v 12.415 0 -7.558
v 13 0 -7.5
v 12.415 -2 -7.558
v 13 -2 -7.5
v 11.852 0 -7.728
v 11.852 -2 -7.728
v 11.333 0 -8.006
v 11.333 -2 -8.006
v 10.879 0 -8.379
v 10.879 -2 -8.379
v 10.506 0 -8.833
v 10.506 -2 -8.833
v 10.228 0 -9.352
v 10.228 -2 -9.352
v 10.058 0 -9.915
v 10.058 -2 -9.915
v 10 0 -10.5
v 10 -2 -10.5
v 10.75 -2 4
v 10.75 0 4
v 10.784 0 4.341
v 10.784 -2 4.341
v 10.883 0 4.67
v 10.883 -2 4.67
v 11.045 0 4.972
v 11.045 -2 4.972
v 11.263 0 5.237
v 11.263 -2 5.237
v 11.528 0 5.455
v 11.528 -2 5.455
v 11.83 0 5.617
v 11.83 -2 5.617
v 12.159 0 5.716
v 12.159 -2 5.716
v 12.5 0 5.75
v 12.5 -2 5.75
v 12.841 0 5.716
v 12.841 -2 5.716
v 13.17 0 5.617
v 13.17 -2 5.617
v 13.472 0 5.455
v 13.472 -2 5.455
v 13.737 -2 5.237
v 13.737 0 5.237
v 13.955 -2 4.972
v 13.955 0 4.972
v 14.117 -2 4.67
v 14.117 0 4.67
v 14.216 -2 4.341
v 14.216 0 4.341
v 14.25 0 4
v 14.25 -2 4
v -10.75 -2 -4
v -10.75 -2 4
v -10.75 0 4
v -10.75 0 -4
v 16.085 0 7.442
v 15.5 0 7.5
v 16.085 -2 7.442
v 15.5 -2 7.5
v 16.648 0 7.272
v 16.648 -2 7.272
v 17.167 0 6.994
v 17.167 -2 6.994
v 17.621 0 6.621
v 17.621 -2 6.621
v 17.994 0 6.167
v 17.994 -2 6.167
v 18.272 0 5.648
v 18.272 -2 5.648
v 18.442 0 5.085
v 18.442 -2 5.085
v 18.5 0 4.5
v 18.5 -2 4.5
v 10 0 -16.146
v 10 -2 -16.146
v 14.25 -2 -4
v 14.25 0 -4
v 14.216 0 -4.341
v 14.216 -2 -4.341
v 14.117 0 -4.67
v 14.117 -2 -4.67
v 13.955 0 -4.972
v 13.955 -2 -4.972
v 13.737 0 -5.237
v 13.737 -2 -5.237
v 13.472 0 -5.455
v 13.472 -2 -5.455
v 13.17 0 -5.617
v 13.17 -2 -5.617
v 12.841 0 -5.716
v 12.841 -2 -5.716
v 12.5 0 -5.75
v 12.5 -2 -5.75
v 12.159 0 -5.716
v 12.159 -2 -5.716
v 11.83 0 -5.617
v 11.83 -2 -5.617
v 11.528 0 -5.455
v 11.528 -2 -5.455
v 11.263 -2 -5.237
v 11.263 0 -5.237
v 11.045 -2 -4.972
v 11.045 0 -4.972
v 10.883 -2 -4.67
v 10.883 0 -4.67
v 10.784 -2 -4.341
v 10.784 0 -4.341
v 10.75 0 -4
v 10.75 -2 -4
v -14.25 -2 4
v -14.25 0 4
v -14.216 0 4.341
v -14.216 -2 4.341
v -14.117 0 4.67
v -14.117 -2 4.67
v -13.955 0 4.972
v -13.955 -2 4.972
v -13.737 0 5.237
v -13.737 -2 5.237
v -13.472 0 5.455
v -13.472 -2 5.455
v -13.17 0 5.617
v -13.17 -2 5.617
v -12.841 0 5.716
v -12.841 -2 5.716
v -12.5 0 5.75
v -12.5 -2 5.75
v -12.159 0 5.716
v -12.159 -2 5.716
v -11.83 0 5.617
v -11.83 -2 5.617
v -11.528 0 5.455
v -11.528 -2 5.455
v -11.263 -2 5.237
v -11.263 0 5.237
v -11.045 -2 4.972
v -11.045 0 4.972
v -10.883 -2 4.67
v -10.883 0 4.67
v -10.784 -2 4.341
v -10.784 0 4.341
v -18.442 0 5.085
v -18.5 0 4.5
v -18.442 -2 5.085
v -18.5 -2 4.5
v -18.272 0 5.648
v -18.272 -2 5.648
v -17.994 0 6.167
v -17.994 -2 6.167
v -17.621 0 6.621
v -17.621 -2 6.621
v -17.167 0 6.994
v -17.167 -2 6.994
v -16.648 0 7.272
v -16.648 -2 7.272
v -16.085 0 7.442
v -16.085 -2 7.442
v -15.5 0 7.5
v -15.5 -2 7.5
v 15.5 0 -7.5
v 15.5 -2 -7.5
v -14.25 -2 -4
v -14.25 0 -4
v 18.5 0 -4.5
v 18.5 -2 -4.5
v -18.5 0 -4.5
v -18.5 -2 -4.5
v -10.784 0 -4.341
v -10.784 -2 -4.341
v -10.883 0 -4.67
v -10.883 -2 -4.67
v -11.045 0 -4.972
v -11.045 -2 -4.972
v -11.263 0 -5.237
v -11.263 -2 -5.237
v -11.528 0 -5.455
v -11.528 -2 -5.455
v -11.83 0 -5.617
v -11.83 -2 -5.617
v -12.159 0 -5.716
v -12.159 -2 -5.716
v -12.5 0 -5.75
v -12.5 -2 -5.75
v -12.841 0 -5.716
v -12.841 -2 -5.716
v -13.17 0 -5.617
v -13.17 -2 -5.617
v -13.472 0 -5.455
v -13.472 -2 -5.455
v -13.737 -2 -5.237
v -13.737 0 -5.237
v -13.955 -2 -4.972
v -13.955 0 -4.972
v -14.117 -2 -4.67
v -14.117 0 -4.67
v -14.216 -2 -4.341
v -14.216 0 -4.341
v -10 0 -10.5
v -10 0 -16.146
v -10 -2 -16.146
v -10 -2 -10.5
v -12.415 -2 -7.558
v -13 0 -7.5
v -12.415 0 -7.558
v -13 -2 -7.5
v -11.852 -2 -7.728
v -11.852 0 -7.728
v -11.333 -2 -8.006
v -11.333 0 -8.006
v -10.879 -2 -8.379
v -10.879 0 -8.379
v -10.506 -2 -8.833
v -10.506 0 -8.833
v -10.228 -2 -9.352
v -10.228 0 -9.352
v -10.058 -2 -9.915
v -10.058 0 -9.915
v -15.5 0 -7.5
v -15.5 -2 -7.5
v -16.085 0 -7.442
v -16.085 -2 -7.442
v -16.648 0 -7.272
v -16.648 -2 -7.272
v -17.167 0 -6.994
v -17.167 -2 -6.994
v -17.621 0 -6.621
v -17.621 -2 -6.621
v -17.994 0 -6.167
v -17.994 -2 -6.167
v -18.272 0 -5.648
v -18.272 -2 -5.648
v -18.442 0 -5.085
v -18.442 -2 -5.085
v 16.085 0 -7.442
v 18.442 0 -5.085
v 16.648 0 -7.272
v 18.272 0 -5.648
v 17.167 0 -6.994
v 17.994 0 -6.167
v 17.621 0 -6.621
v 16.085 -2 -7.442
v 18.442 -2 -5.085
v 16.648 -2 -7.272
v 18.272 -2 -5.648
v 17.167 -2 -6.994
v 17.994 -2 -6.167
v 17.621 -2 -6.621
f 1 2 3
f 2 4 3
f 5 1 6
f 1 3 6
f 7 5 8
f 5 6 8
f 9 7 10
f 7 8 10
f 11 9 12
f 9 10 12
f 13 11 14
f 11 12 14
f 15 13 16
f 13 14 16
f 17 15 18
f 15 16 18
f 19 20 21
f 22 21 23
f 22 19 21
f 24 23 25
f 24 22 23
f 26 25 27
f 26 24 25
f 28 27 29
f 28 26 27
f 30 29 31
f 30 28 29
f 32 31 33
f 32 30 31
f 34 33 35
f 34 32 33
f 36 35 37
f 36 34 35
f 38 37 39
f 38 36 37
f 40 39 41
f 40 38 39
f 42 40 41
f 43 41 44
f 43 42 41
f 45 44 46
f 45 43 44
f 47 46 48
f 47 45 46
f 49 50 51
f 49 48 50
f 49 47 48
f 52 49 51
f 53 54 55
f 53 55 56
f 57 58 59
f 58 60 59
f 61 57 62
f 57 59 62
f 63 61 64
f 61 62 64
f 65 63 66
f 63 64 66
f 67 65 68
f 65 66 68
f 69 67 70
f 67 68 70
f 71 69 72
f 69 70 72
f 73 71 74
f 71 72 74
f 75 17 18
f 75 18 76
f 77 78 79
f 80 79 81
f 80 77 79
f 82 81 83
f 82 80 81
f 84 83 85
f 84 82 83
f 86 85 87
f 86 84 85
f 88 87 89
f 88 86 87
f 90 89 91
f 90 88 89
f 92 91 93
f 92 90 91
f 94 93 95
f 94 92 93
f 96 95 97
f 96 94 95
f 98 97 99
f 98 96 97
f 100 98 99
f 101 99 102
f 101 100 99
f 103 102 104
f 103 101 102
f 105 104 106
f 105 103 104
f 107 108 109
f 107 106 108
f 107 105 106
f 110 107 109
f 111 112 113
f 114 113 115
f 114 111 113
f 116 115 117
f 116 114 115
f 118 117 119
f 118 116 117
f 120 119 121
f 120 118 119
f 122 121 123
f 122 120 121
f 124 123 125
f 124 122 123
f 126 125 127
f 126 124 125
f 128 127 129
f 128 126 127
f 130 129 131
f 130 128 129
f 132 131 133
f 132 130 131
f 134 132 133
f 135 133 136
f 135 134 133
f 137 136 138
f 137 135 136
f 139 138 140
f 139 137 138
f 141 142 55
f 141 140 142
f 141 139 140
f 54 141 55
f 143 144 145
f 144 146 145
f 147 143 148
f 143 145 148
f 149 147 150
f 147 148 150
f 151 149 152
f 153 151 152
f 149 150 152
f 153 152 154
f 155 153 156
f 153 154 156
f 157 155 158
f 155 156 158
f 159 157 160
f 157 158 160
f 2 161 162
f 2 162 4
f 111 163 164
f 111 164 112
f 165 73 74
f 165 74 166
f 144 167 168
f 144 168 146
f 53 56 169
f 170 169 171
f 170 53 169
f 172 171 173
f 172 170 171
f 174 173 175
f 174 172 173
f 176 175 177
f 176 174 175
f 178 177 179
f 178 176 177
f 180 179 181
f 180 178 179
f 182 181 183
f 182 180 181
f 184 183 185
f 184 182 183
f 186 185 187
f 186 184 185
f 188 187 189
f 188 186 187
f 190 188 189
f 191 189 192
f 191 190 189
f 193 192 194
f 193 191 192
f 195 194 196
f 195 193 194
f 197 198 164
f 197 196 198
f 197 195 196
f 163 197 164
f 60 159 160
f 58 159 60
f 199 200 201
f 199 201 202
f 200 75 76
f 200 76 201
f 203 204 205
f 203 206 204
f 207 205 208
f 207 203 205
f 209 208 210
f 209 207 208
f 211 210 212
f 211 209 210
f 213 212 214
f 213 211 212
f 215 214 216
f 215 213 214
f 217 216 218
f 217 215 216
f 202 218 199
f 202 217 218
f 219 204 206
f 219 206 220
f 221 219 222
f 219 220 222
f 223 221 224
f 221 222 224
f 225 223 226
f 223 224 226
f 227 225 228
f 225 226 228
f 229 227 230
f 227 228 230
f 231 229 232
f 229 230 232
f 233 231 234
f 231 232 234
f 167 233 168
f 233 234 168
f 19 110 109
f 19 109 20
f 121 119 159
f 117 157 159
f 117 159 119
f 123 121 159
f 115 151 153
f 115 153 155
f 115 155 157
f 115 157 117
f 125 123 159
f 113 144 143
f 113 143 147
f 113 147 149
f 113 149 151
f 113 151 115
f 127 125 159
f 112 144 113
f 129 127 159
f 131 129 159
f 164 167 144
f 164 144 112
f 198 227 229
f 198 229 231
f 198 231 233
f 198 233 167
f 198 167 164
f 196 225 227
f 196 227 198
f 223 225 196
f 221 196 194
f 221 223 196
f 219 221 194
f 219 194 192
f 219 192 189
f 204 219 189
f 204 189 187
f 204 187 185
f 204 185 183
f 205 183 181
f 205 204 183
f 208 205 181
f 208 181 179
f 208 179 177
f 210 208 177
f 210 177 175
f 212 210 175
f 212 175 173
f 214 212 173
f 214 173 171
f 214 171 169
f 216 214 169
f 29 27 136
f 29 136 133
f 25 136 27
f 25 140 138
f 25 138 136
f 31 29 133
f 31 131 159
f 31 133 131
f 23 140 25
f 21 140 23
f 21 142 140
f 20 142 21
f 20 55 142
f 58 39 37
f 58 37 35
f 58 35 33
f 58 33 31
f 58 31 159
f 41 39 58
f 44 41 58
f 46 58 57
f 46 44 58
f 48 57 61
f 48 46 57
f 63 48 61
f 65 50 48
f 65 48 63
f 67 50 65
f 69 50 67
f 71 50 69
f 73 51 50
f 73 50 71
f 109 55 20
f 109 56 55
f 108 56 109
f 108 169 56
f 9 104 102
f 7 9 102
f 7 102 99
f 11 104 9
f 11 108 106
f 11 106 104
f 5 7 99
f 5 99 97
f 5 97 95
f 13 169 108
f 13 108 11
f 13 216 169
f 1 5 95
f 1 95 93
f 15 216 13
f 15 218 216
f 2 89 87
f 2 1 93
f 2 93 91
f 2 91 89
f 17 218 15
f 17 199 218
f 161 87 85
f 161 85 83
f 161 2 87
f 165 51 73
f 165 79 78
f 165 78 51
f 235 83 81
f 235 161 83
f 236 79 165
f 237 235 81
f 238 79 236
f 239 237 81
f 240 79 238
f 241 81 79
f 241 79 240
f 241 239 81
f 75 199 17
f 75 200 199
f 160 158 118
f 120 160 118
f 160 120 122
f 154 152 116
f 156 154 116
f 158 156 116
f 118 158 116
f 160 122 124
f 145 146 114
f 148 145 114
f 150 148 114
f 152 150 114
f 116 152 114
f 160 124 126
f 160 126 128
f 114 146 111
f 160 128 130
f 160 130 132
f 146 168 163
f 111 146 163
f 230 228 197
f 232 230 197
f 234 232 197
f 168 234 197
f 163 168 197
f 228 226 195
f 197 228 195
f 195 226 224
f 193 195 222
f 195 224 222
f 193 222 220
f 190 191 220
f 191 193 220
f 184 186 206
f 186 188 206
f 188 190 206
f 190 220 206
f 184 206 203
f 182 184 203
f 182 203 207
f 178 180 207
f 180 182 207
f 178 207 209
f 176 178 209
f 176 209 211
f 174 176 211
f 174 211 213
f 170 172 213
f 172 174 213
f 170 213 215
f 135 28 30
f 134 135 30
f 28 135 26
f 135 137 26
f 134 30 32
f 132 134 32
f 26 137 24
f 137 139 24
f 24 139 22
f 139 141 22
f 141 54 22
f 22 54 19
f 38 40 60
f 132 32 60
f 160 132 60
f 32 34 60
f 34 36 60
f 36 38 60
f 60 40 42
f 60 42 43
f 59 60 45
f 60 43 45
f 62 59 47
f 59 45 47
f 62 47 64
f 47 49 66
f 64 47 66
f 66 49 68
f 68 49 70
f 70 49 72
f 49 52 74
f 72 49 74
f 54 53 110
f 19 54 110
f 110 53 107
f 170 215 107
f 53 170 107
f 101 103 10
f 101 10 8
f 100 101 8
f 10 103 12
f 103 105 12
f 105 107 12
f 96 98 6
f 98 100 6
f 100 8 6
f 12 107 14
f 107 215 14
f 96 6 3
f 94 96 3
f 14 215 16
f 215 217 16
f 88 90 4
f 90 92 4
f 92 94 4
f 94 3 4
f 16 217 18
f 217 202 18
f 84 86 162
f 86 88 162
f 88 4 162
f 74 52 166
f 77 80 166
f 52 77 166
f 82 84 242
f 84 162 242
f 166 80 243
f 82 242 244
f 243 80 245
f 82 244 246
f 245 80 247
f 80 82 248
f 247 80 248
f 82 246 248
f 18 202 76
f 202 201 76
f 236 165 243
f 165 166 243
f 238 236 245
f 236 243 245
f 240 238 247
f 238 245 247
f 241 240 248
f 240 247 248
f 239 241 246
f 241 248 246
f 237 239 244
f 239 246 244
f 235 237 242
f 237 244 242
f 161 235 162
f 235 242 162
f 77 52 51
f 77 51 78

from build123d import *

# Parameters (mm, degrees)
SM_BASE_FLANGE_1_DEPTH = 2
FILLET_1_R             = 3
CUT_EXTRUDE_1_DEPTH    = 10


# Sheet-metal steps are written as plain solids
with BuildPart() as part:
    # Sketch 1 → 基体-法兰1 (new body)
    with BuildSketch(Plane(origin=(0, 0, 0), x_dir=(1, 0, 0), z_dir=(0, 1, 0))):
        Polygon((-10, 7.5), (-18.5, 7.5), (-18.5, -7.5), (18.5, -7.5), (18.5, 7.5), (10, 7.5), (10, 16.146039932), (-10, 16.146039932), align=None)
    extrude(amount=-SM_BASE_FLANGE_1_DEPTH)

    # 圆角1
    fillet_1_edges = [part.edges().sort_by_distance(p)[0] for p in [
        (18.5, -1, -7.5),
        (18.5, -1, 7.5),
        (-18.5, -1, 7.5),
        (-18.5, -1, -7.5),
        (-10, -1, -7.5),
        (10, -1, -7.5),
    ]]
    fillet(fillet_1_edges, radius=FILLET_1_R)

    # 草图6 → 切除-拉伸1 (cut)
    with BuildSketch(Plane.XZ.offset(2)):
        with BuildLine():
            Line((-10.75, 4), (-10.75, -4))
            ThreePointArc((-10.75, -4), (-12.5, -5.75), (-14.25, -4))
            Line((-14.25, -4), (-14.25, 4))
            ThreePointArc((-14.25, 4), (-12.5, 5.75), (-10.75, 4))
        make_face()
        with BuildLine():
            Line((14.25, 4), (14.25, -4))
            ThreePointArc((14.25, -4), (12.5, -5.75), (10.75, -4))
            Line((10.75, -4), (10.75, 4))
            ThreePointArc((10.75, 4), (12.5, 5.75), (14.25, 4))
        make_face()
    extrude(amount=-CUT_EXTRUDE_1_DEPTH, mode=Mode.SUBTRACT)


solid = part.part
